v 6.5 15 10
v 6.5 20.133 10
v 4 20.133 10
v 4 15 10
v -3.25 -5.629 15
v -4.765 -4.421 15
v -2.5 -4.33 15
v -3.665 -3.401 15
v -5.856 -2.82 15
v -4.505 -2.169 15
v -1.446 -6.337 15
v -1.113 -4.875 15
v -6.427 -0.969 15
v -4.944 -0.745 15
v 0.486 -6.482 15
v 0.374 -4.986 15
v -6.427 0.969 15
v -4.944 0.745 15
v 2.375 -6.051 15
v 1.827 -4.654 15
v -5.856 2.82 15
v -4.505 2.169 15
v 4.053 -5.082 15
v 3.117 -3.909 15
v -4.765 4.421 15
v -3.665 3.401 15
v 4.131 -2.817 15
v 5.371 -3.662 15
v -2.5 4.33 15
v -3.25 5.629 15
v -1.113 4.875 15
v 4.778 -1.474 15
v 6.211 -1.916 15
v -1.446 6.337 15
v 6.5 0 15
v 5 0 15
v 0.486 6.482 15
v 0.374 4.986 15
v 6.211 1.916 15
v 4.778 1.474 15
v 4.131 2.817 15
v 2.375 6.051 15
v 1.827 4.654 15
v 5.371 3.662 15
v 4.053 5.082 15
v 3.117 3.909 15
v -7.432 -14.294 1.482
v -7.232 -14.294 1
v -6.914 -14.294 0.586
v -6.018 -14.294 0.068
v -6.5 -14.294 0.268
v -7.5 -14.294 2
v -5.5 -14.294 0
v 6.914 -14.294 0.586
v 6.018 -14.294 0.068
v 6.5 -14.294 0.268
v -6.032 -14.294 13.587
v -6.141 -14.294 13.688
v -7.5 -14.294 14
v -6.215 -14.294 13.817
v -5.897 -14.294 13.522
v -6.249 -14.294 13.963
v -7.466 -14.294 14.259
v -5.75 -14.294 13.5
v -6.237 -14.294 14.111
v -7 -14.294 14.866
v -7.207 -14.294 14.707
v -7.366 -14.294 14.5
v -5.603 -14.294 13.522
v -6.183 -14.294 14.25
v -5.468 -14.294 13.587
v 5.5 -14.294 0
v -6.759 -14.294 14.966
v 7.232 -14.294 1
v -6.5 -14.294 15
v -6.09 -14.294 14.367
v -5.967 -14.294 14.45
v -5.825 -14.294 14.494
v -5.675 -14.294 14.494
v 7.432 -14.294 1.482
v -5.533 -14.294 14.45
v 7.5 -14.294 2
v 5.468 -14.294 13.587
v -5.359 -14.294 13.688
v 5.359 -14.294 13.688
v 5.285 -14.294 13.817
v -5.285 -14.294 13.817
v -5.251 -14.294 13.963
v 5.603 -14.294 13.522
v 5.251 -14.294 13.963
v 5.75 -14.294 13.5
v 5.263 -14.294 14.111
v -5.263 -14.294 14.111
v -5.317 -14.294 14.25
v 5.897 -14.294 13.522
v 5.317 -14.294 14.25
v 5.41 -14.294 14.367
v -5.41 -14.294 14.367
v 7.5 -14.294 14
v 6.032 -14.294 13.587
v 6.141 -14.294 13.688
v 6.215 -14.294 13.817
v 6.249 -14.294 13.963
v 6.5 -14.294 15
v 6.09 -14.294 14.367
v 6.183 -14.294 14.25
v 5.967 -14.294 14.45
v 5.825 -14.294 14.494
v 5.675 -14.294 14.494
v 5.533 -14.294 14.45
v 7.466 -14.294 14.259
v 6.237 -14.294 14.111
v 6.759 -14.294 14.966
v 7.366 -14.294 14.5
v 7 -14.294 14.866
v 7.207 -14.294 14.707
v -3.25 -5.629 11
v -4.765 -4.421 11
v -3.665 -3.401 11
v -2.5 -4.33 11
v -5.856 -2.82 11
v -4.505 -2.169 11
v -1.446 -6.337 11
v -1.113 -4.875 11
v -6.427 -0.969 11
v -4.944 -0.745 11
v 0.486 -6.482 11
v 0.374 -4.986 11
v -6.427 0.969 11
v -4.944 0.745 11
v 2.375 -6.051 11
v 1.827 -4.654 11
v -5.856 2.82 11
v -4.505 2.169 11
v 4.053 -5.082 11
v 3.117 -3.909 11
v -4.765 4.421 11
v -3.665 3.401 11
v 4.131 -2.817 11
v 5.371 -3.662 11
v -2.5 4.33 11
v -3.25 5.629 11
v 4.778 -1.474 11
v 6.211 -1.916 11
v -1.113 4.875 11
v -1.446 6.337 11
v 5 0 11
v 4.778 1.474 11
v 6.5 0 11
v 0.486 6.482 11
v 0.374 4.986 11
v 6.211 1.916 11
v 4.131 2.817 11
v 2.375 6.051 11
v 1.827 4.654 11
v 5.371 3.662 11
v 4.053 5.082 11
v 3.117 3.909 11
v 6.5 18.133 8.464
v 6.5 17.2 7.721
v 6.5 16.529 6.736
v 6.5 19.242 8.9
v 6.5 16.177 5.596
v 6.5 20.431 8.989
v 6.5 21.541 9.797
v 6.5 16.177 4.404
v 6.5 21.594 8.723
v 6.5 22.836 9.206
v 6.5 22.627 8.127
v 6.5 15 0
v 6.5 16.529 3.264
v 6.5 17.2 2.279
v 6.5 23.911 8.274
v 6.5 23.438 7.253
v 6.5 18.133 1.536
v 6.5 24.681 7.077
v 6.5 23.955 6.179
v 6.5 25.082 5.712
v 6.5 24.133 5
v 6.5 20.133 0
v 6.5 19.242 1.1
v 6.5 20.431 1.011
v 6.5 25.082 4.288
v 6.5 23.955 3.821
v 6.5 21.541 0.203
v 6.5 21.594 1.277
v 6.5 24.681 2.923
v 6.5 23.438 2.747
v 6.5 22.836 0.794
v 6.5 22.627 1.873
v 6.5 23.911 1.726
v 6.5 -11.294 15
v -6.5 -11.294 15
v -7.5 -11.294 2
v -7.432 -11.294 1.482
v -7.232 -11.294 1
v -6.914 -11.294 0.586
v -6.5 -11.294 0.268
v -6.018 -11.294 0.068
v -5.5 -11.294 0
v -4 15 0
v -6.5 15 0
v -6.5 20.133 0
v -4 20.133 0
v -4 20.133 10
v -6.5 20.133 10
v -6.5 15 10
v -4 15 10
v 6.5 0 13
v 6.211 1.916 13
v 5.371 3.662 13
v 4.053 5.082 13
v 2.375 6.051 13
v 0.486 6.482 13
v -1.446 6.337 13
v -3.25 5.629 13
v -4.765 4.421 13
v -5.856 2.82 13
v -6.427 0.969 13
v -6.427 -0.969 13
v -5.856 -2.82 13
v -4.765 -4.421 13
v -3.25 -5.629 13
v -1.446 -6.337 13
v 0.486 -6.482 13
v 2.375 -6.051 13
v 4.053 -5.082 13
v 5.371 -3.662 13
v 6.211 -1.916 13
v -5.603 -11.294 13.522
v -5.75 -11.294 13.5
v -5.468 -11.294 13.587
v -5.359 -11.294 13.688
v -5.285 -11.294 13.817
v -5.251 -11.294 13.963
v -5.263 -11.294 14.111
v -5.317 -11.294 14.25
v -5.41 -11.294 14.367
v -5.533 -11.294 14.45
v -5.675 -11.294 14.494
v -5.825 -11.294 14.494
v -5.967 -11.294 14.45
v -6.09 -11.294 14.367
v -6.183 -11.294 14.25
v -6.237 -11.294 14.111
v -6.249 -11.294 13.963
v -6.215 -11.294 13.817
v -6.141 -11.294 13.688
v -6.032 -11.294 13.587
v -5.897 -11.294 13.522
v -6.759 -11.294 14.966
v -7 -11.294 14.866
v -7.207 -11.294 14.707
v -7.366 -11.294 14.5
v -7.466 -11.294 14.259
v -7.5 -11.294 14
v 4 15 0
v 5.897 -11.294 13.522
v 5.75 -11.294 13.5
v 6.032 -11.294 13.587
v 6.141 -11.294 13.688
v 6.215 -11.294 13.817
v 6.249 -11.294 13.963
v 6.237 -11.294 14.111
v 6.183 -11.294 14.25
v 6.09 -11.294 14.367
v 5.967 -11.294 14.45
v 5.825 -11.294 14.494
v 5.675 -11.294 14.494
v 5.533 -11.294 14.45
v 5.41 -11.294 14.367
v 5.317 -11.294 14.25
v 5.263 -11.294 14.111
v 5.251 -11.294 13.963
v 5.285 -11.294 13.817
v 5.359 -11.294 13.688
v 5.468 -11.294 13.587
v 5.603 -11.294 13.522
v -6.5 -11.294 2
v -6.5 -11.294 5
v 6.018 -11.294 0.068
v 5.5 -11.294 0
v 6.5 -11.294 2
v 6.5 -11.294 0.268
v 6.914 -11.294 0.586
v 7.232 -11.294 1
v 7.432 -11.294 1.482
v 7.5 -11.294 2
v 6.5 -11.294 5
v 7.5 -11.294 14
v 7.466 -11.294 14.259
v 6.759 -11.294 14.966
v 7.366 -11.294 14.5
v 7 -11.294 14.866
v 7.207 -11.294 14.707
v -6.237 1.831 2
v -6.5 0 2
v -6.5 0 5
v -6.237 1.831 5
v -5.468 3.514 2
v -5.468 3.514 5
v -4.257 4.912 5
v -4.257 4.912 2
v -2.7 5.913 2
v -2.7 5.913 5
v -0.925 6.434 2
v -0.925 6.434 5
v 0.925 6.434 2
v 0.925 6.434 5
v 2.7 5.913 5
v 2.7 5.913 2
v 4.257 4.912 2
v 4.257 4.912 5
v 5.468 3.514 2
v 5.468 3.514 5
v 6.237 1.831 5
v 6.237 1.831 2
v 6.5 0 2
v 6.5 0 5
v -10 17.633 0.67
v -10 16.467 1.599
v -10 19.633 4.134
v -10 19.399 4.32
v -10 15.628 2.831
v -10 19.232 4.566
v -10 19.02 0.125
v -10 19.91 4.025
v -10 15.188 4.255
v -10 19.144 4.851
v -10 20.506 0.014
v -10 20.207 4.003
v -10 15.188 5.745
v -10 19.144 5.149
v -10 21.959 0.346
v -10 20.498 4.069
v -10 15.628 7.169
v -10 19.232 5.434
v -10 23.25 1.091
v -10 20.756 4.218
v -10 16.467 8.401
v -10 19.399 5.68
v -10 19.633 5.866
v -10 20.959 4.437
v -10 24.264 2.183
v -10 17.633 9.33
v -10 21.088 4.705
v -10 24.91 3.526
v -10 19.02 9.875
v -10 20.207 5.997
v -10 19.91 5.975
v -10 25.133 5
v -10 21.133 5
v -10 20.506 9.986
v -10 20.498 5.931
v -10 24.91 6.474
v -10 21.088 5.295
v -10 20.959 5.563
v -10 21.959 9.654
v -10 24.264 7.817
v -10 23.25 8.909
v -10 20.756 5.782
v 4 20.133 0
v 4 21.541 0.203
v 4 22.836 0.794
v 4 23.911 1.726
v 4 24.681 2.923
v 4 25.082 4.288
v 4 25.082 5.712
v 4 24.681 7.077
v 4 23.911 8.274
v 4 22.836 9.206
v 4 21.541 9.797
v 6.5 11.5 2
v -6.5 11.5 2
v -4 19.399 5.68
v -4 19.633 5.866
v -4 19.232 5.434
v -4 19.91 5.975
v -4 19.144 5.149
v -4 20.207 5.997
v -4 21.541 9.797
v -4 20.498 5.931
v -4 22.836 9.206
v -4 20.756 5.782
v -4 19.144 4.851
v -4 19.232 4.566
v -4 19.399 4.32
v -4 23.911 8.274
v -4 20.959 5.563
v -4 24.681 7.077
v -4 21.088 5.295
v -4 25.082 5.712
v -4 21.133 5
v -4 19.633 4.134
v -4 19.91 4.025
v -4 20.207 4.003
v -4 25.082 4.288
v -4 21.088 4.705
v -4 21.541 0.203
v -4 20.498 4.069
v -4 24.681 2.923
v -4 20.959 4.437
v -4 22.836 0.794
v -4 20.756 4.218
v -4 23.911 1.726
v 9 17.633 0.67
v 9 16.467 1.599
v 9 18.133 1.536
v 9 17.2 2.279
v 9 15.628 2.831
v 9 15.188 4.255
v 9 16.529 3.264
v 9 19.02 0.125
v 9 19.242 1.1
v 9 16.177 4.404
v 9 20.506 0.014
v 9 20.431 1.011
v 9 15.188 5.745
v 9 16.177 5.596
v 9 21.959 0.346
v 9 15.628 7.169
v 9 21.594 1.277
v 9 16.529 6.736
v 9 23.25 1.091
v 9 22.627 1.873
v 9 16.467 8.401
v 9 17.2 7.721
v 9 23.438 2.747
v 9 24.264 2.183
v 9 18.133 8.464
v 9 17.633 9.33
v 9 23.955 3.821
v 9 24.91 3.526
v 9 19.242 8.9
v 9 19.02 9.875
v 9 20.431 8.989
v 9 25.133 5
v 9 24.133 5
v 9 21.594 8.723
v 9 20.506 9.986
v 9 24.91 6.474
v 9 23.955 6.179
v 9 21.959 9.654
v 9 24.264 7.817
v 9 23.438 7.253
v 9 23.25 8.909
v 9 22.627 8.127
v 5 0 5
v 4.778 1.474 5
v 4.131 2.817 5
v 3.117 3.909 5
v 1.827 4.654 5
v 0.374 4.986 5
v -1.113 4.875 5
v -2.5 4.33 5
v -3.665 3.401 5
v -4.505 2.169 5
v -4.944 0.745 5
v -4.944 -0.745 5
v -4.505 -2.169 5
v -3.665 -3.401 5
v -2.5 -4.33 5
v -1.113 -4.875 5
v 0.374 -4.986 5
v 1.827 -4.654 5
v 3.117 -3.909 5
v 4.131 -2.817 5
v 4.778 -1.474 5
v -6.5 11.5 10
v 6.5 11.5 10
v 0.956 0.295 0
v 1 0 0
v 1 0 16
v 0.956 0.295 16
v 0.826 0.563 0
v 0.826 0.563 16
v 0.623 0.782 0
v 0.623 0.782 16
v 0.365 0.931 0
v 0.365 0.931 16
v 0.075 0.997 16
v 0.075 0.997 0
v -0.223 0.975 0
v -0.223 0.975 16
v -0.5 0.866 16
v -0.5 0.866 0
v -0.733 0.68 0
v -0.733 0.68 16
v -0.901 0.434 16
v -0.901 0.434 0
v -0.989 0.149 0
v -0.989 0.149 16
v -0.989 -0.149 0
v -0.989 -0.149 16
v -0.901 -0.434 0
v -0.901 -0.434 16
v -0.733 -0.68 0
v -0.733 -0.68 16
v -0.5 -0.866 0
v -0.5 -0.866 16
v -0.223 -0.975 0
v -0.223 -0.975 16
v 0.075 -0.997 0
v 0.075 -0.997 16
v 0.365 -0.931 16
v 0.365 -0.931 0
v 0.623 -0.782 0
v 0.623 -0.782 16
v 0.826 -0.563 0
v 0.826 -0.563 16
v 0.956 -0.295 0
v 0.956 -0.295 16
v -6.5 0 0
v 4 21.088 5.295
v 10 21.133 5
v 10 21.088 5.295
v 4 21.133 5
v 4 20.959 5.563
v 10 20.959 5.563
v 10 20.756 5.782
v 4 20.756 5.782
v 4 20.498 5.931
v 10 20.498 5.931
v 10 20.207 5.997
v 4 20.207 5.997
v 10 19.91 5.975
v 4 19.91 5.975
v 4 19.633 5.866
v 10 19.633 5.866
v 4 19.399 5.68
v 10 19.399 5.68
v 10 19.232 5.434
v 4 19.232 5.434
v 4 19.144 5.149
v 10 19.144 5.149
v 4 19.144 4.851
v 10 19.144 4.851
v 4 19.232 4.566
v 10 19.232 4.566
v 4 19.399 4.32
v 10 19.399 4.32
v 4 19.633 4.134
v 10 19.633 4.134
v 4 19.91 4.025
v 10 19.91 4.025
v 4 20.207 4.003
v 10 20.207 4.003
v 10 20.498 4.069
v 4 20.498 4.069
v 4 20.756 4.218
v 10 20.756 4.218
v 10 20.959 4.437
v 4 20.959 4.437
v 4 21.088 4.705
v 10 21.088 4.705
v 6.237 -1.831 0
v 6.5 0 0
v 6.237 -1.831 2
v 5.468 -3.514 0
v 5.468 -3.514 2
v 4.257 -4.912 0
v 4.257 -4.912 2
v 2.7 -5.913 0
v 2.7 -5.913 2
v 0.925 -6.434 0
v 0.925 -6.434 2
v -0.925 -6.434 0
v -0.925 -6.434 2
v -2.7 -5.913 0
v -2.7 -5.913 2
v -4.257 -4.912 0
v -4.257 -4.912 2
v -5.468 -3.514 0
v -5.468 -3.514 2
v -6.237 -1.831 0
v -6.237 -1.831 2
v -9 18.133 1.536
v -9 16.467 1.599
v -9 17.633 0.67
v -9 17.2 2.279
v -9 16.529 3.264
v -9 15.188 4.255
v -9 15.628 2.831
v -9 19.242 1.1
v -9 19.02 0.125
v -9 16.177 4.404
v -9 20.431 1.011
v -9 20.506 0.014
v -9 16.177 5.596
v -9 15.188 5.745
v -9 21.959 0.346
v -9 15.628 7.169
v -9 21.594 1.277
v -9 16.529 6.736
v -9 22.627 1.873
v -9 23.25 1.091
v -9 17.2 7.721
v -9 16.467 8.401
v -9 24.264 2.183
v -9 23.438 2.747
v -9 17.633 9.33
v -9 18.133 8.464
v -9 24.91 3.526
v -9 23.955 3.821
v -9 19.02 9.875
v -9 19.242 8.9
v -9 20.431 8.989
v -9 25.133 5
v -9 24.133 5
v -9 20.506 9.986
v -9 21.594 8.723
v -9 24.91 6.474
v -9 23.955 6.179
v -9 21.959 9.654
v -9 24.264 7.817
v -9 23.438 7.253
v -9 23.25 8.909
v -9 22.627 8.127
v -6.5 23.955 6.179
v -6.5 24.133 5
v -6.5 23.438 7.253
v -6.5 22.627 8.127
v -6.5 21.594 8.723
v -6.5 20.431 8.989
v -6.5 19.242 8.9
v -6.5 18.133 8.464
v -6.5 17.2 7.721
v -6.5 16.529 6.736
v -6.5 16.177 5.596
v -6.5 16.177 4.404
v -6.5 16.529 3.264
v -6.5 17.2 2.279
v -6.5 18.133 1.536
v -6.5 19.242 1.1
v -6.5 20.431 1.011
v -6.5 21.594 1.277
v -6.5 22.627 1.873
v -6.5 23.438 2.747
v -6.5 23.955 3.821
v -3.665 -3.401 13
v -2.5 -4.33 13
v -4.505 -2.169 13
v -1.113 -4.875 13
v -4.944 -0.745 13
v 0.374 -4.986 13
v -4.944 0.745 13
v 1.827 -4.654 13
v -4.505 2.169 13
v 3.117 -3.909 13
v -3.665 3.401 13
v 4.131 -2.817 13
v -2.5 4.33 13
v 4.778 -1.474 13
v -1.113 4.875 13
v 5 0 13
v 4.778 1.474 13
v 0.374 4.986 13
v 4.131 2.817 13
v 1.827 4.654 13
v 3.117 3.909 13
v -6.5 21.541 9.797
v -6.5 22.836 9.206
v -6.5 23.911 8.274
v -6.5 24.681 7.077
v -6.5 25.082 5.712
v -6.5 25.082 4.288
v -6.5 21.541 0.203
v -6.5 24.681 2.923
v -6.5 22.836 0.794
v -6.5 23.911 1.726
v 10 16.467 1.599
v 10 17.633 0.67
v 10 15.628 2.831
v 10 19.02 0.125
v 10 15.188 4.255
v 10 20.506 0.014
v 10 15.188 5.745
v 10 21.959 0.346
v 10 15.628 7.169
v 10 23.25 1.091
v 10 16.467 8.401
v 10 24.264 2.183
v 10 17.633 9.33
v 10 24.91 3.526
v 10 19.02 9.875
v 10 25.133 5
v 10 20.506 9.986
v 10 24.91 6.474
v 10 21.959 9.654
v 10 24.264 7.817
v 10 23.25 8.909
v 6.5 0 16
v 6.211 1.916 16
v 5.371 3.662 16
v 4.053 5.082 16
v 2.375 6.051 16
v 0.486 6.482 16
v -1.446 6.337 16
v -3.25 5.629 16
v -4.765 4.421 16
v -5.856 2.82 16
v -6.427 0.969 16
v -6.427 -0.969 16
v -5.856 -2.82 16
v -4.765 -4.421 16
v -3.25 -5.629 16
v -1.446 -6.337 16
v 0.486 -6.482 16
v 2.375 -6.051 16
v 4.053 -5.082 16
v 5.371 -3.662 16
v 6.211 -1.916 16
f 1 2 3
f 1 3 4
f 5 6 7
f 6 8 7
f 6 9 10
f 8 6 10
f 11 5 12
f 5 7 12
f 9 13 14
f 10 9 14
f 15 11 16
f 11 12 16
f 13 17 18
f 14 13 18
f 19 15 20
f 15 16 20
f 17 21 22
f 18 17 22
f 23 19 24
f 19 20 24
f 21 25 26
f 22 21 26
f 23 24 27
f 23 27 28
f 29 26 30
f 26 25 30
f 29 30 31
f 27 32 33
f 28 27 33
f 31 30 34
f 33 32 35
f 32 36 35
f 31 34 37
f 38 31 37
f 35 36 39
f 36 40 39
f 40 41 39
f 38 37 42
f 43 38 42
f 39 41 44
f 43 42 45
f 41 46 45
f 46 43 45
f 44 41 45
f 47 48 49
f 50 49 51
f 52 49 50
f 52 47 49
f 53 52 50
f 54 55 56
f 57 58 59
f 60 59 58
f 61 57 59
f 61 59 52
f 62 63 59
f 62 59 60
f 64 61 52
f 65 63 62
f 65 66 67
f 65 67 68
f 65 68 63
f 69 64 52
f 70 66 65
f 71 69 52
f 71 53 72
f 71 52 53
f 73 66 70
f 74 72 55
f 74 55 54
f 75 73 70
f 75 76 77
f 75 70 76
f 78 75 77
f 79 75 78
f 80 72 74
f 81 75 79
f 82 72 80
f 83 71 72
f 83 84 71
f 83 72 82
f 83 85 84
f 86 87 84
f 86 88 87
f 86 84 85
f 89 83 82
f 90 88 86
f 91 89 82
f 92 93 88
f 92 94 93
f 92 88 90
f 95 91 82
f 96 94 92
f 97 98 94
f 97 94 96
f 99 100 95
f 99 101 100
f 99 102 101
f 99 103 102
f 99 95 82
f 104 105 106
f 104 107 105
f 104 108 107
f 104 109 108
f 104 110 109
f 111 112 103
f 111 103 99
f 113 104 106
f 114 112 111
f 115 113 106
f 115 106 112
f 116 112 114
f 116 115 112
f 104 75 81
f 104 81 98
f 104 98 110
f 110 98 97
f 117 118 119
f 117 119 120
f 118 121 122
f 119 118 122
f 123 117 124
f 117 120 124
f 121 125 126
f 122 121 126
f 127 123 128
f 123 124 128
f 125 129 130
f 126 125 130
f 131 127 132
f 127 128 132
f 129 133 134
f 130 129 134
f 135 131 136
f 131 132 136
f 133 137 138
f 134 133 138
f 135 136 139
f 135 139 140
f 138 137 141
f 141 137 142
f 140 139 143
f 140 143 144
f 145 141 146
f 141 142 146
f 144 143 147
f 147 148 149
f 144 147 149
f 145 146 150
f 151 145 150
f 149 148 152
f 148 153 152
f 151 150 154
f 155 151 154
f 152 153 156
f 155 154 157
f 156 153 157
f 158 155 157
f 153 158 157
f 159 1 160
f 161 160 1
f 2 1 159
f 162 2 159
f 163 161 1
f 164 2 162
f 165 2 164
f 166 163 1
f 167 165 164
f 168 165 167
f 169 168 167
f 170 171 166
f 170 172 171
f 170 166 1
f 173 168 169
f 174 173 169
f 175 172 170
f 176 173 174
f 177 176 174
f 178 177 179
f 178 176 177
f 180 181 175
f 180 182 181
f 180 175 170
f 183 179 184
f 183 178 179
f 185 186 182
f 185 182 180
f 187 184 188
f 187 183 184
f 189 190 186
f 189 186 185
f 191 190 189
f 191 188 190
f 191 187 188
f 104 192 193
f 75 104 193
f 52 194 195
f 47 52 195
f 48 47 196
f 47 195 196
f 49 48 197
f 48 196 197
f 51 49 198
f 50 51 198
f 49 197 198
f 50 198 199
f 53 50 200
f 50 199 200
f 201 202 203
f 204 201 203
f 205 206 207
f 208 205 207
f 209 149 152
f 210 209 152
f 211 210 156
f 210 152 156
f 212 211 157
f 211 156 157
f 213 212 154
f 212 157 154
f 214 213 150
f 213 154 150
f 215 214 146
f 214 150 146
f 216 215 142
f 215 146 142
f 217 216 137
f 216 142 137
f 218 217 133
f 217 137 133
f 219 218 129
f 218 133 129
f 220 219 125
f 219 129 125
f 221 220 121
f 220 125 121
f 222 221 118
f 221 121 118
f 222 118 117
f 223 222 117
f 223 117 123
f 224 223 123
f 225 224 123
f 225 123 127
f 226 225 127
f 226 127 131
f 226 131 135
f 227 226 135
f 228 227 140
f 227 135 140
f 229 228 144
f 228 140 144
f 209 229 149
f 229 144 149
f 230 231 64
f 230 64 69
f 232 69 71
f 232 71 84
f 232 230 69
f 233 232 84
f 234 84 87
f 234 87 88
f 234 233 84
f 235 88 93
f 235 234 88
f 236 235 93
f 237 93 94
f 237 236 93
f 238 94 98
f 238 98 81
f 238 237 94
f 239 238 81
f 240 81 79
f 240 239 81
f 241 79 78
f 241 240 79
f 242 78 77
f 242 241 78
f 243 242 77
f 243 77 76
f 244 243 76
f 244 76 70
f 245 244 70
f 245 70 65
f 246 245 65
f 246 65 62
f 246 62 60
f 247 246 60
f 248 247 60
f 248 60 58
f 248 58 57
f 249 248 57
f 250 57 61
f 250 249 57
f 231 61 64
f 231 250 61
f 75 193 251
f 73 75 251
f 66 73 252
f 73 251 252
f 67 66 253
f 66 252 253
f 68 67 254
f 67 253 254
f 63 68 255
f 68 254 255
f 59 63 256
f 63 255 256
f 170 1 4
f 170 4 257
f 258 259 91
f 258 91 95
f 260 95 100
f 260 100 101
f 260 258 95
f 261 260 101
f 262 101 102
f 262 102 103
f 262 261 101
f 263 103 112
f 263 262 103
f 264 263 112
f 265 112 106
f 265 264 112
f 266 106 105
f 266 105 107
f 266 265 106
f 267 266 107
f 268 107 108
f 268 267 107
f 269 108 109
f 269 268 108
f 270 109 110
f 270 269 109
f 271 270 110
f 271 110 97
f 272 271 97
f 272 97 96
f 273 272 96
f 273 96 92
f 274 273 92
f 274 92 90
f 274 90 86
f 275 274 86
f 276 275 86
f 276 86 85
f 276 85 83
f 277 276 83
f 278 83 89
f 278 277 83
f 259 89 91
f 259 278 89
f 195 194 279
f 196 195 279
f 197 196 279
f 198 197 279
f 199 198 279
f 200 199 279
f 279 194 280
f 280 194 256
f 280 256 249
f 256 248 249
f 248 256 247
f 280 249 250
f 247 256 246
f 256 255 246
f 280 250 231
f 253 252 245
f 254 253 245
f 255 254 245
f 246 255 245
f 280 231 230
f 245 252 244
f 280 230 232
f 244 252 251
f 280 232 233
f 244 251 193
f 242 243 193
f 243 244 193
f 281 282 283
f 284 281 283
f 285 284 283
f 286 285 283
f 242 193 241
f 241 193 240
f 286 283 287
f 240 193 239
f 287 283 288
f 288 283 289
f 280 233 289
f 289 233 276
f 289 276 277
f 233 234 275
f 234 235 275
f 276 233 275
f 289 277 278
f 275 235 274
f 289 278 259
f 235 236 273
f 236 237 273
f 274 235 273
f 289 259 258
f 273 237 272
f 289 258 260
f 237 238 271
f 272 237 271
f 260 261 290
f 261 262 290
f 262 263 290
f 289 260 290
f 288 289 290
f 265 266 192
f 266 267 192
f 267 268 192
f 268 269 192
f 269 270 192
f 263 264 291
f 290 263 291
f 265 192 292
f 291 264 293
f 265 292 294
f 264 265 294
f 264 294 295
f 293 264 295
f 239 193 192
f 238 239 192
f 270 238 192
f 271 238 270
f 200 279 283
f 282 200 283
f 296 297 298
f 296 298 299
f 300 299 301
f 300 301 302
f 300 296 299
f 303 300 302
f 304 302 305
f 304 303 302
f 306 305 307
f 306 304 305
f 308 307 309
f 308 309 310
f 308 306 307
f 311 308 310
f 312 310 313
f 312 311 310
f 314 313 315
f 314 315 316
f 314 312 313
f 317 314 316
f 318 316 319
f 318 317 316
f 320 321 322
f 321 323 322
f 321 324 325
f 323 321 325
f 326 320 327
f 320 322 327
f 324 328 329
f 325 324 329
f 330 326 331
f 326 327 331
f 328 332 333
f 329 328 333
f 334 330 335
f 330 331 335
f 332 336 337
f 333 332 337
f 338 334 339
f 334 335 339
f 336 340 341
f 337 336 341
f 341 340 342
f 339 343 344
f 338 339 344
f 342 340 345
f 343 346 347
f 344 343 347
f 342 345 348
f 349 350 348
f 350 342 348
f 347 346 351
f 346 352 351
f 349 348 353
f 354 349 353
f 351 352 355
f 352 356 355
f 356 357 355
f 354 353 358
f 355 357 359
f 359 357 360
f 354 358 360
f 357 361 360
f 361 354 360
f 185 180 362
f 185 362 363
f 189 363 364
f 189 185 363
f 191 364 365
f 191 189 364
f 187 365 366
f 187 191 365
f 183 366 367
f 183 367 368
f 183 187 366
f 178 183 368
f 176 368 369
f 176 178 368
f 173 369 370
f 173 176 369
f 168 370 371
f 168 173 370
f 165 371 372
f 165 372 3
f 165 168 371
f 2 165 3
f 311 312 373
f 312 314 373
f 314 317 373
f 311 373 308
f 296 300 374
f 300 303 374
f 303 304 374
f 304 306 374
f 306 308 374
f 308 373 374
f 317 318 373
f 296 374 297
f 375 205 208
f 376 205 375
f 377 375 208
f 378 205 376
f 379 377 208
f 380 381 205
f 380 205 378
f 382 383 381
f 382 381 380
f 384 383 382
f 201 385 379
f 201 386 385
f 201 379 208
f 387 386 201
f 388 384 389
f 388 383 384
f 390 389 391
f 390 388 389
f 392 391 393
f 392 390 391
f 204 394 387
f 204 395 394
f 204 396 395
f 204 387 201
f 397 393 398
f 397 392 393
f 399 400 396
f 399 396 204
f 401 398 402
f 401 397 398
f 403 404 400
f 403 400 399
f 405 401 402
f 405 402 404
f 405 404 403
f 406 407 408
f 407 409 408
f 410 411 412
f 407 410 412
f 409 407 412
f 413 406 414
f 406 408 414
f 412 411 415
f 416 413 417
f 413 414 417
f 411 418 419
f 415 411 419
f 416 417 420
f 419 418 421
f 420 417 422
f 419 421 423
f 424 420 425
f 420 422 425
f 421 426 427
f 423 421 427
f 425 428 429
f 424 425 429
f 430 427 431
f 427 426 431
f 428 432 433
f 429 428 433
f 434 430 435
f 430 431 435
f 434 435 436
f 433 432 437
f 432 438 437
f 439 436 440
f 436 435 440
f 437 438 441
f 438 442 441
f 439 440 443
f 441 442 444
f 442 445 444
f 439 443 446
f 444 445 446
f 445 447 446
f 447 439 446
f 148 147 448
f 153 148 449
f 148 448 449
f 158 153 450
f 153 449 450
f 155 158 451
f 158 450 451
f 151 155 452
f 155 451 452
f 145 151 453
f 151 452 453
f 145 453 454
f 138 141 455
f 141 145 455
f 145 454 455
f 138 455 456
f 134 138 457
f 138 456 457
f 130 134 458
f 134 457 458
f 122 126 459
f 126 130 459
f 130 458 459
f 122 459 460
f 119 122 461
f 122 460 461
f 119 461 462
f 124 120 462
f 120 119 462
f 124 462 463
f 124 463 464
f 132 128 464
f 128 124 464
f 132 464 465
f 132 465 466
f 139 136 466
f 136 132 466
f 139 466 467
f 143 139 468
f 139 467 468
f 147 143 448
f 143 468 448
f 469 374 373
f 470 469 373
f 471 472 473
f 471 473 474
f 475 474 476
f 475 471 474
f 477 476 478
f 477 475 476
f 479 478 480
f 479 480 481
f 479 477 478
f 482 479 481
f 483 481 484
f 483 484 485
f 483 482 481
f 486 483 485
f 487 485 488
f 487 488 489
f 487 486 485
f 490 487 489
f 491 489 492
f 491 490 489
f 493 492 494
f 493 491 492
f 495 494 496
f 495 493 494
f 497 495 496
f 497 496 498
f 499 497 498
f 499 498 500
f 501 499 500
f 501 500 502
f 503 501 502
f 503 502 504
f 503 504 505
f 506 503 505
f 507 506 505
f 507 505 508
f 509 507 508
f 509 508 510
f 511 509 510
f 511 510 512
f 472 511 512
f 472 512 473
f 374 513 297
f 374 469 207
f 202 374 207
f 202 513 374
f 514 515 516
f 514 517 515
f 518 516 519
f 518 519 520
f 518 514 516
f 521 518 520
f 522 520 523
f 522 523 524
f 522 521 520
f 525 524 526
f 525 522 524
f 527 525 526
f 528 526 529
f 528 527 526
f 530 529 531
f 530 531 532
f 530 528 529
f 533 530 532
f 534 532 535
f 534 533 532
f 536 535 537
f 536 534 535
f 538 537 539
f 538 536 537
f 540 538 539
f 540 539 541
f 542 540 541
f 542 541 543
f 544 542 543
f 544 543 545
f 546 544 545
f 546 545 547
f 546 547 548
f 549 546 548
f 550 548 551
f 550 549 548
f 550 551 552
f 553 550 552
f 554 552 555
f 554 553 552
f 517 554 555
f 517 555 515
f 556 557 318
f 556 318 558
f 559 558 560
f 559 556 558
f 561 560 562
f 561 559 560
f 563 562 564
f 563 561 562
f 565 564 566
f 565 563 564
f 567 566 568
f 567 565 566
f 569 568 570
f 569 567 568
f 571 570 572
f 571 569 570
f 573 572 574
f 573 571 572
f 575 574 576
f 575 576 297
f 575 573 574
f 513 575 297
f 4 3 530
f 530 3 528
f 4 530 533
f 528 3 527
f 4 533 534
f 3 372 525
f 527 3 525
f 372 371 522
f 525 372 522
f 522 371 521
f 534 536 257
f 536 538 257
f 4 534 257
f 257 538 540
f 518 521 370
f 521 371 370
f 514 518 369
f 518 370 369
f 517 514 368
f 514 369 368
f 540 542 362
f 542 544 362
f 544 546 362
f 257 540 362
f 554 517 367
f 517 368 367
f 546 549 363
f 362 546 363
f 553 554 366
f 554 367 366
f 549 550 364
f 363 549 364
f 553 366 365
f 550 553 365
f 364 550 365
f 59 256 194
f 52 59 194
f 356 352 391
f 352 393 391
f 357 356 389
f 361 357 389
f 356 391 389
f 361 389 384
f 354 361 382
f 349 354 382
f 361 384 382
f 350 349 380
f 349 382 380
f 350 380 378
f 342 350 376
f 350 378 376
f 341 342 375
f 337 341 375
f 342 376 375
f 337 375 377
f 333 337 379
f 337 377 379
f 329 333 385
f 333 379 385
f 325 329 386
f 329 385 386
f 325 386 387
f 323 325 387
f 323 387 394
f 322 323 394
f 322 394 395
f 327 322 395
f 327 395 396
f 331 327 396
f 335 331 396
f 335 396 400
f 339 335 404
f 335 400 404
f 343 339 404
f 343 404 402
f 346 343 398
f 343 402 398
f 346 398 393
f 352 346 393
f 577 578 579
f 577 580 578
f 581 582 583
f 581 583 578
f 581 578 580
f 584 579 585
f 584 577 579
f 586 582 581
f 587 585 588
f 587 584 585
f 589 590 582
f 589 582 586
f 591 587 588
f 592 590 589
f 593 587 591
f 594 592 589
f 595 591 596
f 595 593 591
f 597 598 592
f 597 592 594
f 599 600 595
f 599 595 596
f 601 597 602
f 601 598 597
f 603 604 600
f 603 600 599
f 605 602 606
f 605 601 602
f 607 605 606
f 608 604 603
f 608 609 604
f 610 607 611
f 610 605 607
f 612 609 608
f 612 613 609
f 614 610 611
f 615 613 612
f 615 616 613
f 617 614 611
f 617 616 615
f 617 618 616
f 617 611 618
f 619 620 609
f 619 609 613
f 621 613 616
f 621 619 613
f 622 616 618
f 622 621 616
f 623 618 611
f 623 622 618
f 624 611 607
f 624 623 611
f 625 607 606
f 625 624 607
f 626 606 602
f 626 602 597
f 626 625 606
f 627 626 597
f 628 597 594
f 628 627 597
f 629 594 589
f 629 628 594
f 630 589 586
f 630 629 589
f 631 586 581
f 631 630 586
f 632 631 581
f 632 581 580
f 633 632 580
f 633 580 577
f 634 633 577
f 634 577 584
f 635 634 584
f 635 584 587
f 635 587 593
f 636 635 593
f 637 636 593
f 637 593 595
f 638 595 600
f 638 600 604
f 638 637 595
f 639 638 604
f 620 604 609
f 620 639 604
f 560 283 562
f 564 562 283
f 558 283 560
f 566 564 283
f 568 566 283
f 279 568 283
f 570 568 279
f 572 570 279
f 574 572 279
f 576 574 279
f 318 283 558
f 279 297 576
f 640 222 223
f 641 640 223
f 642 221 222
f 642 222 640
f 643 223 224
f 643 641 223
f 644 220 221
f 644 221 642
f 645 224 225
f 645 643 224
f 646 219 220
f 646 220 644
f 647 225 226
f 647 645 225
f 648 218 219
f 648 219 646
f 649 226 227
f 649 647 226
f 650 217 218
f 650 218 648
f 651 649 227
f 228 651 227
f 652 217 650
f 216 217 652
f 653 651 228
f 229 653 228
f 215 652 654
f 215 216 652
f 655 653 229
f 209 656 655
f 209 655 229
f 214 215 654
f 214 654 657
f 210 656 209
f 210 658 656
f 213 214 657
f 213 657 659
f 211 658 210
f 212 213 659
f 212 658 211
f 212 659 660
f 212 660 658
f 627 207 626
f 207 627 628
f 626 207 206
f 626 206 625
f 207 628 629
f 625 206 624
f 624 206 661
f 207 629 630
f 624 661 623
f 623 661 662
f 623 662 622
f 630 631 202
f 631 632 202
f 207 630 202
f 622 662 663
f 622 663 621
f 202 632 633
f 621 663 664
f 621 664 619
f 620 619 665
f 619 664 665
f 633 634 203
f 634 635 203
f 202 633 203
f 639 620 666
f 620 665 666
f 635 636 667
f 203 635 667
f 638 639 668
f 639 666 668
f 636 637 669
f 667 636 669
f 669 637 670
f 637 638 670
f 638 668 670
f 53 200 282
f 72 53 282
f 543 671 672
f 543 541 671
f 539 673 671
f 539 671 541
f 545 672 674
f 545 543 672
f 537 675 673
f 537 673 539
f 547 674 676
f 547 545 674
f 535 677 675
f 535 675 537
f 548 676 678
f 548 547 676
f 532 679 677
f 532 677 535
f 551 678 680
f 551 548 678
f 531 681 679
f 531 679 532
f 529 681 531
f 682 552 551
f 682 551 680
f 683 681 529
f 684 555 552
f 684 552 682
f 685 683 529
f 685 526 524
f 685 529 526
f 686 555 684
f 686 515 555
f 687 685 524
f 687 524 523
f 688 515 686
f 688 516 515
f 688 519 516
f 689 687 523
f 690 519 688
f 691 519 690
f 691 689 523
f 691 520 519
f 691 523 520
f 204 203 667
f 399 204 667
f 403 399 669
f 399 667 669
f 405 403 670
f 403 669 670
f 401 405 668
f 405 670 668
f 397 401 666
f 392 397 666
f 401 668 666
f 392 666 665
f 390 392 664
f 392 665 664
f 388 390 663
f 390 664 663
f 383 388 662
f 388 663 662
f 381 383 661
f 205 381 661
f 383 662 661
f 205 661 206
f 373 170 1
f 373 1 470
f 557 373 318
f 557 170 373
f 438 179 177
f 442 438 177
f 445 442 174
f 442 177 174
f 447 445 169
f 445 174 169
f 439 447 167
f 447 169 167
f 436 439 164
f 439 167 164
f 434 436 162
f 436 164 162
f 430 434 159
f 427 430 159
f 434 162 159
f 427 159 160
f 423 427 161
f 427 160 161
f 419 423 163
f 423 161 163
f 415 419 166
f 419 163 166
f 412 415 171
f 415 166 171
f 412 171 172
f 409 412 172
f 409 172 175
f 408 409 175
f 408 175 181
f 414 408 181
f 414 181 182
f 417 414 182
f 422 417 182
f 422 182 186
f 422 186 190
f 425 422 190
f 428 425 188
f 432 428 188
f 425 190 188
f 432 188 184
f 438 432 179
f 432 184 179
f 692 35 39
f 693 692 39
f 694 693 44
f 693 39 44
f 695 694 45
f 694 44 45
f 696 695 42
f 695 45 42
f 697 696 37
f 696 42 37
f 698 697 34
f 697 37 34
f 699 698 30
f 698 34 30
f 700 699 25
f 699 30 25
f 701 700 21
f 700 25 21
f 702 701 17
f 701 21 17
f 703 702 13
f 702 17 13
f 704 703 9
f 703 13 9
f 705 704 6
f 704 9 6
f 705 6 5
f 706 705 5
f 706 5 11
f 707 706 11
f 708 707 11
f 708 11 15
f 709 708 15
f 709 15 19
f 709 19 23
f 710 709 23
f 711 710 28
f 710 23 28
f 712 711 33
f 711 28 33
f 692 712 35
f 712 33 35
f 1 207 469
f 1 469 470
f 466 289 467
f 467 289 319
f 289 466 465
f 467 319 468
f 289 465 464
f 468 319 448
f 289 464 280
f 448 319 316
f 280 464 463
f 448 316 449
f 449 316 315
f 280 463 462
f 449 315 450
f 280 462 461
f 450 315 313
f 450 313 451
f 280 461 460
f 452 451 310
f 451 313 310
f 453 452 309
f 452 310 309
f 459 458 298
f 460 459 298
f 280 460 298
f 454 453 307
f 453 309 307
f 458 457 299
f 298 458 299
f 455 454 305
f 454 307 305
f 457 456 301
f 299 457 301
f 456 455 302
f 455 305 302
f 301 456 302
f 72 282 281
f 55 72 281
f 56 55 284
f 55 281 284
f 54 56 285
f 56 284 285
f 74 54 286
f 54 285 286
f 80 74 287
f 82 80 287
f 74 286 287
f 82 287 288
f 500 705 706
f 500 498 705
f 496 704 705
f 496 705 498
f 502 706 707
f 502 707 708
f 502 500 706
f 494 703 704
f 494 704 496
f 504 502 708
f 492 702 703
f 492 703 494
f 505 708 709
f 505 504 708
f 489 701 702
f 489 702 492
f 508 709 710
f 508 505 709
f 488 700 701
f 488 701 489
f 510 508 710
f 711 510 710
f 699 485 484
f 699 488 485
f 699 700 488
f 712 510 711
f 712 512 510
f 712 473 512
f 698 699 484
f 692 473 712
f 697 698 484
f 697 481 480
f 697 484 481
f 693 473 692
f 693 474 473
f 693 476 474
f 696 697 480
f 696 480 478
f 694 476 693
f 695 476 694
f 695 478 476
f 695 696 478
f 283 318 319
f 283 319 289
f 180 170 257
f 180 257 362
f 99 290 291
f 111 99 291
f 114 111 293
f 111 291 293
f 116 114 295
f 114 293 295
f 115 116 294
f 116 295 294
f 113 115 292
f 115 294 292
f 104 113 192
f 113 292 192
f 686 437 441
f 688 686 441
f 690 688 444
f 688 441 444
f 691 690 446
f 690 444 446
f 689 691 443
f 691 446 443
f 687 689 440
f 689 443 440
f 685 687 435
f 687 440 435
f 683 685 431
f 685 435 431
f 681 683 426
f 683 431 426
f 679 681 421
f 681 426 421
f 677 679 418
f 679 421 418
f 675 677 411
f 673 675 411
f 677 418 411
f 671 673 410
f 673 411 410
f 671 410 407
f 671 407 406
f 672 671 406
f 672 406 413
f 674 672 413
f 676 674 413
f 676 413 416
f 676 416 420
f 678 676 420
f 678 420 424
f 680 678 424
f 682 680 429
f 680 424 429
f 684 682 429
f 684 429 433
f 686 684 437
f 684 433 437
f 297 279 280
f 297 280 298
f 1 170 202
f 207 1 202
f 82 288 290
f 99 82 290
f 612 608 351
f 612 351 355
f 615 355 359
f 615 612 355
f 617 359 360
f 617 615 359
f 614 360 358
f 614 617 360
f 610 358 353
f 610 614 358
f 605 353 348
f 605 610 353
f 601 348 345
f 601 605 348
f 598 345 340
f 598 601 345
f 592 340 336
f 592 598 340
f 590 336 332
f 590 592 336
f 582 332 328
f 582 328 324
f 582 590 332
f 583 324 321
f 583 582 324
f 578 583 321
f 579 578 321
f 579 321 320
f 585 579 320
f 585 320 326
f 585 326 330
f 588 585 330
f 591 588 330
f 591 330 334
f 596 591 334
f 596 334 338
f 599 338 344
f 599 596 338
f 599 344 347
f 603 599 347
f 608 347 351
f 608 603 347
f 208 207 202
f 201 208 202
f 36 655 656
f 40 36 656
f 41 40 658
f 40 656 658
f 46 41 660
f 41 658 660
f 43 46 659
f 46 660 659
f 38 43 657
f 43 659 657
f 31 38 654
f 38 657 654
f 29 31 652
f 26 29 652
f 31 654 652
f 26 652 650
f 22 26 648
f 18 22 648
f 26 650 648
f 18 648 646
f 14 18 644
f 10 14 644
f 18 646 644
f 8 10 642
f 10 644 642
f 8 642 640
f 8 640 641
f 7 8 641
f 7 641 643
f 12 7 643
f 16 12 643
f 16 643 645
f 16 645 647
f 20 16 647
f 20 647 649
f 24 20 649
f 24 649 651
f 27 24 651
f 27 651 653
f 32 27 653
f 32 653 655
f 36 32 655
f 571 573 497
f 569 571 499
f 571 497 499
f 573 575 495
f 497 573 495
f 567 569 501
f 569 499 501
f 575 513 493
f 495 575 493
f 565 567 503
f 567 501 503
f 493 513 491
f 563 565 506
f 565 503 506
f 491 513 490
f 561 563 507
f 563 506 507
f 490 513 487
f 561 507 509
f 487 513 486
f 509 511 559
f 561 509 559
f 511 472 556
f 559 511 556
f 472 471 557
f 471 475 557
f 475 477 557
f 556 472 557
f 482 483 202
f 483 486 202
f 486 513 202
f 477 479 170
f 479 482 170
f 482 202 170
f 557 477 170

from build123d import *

# Parameters (mm, degrees)
SKETCH4_R            = 5
SKETCH4_R_2          = 1
BOSS_EXTRUDE5_DEPTH  = 15
BOSS_EXTRUDE7_START  = -4
SKETCH5_R            = 6.5
SKETCH5_R_2          = 1
BOSS_EXTRUDE7_DEPTH  = 2
SKETCH7_R            = 6.5
SKETCH7_R_2          = 1
BOSS_EXTRUDE8_DEPTH  = 1
SKETCH8_R            = 1
BOSS_EXTRUDE9_DEPTH  = 2
BOSS_EXTRUDE10_DEPTH = 10
SKETCH10_R           = 1
BOSS_EXTRUDE11_DEPTH = 2.5
SKETCH11_R           = 4
SKETCH11_R_2         = 1
BOSS_EXTRUDE12_DEPTH = 2.5
SKETCH12_R           = 5
SKETCH12_R_2         = 1
BOSS_EXTRUDE13_DEPTH = 1
SKETCH13_R           = 5
BOSS_EXTRUDE14_DEPTH = 3
SKETCH14_R           = 0.5
BOSS_EXTRUDE15_DEPTH = 3


with BuildPart() as part:
    # Sketch4 → Boss-Extrude5 (new body)
    with BuildSketch(Plane.XY):
        Circle(SKETCH4_R)
        Circle(SKETCH4_R_2, mode=Mode.SUBTRACT)
    extrude(amount=BOSS_EXTRUDE5_DEPTH)

    # Sketch5 → Boss-Extrude7 (add)
    with BuildSketch(Plane.XY.offset(15).offset(BOSS_EXTRUDE7_START)):
        Circle(SKETCH5_R)
        Circle(SKETCH5_R_2, mode=Mode.SUBTRACT)
    extrude(amount=BOSS_EXTRUDE7_DEPTH)

    # Sketch7 → Boss-Extrude8 (add)
    with BuildSketch(Plane.XY.offset(15)):
        Circle(SKETCH7_R)
        Circle(SKETCH7_R_2, mode=Mode.SUBTRACT)
    extrude(amount=BOSS_EXTRUDE8_DEPTH)

    # Sketch8 → Boss-Extrude9 (add)
    with BuildSketch(Plane(origin=(0, 0, 0), x_dir=(-1, 0, 0), z_dir=(0, 0, -1))):
        with BuildLine():
            Line((6.5, 0), (6.5, 13))
            Line((6.5, 13), (-6.5, 13))
            Line((-6.5, 13), (-6.5, 0))
            ThreePointArc((-6.5, 0), (0, -6.5), (6.5, 0))
        make_face()
        with Locations(Location((0, 0, 0), (0, 0, 180))):
            Circle(SKETCH8_R, mode=Mode.SUBTRACT)
    extrude(amount=-BOSS_EXTRUDE9_DEPTH)

    # Sketch9 → Boss-Extrude10 (add)
    with BuildSketch(Plane(origin=(0, 0, 0), x_dir=(-1, 0, 0), z_dir=(0, 0, -1))):
        Polygon((-6.5, 13), (-6.5, 15), (6.5, 15), (6.5, 13), (6.5, 11.5), (-6.5, 11.5), align=None)
    extrude(amount=-BOSS_EXTRUDE10_DEPTH)

    # Sketch13 → Boss-Extrude14 (add)
    with BuildSketch(Plane.XY.offset(2)):
        with BuildLine():
            Line((6.5, 0), (6.5, -11.293549967))
            Line((6.5, -11.293549967), (-6.5, -11.293549967))
            Line((-6.5, -11.293549967), (-6.5, 0))
            ThreePointArc((-6.5, 0), (0, 6.5), (6.5, 0))
        make_face()
        Circle(SKETCH13_R, mode=Mode.SUBTRACT)
    extrude(amount=BOSS_EXTRUDE14_DEPTH)

    # Sketch14 → Boss-Extrude15 (add)
    with BuildSketch(Plane.XZ.offset(11.293549967)):
        with BuildLine():
            Line((6.5, 15), (-6.5, 15))
            ThreePointArc((-6.5, 15), (-7.207106781, 14.707106781), (-7.5, 14))
            Line((-7.5, 14), (-7.5, 2))
            ThreePointArc((-7.5, 2), (-6.914213562, 0.585786438), (-5.5, 0))
            Line((-5.5, 0), (5.5, 0))
            ThreePointArc((5.5, 0), (6.914213562, 0.585786438), (7.5, 2))
            Line((7.5, 2), (7.5, 14))
            ThreePointArc((7.5, 14), (7.207106781, 14.707106781), (6.5, 15))
        make_face()
        with Locations(Location((5.75, 14, 0), (0, 0, 270))):
            Circle(SKETCH14_R, mode=Mode.SUBTRACT)
        with Locations(Location((-5.75, 14, 0), (0, 0, 270))):
            Circle(SKETCH14_R, mode=Mode.SUBTRACT)
    extrude(amount=BOSS_EXTRUDE15_DEPTH)


with BuildPart() as body_2:
    # Sketch10 → Boss-Extrude11 (new body)
    with BuildSketch(Plane(origin=(6.5, 0, 0), x_dir=(0, 0, -1), z_dir=(1, 0, 0))):
        with BuildLine():
            Line((-10, 20.132551776), (-10, 15))
            Line((-10, 15), (0, 15))
            Line((0, 15), (0, 20.132551776))
            ThreePointArc((0, 20.132551776), (-5, 25.132551776), (-10, 20.132551776))
        make_face()
        with Locations(Location((-5, 20.132551776, 0), (0, 0, 90))):
            Circle(SKETCH10_R, mode=Mode.SUBTRACT)
    extrude(amount=-BOSS_EXTRUDE11_DEPTH)

    # Sketch11 → Boss-Extrude12 (add)
    with BuildSketch(Plane(origin=(6.5, 0, 0), x_dir=(0, 0, -1), z_dir=(1, 0, 0))):
        with Locations(Location((-5, 20.132551776, 0), (0, 0, 90))):
            Circle(SKETCH11_R)
        with Locations(Location((-5, 20.132551776, 0), (0, 0, 90))):
            Circle(SKETCH11_R_2, mode=Mode.SUBTRACT)
    extrude(amount=BOSS_EXTRUDE12_DEPTH)

    # Sketch12 → Boss-Extrude13 (add)
    with BuildSketch(Plane(origin=(9, 0, 0), x_dir=(0, 0, -1), z_dir=(1, 0, 0))):
        with Locations(Location((-5, 20.132551776, 0), (0, 0, 90))):
            Circle(SKETCH12_R)
        with Locations(Location((-5, 20.132551776, 0), (0, 0, 90))):
            Circle(SKETCH12_R_2, mode=Mode.SUBTRACT)
    extrude(amount=BOSS_EXTRUDE13_DEPTH)


with BuildPart() as body_3:
    # Mirror4: mirrored copy
    add(body_2.part.mirror(Plane(origin=(0, 0, 0), x_dir=(0, 0, 1), z_dir=(1, 0, 0))))


solid = Compound([part.part, body_2.part, body_3.part])
